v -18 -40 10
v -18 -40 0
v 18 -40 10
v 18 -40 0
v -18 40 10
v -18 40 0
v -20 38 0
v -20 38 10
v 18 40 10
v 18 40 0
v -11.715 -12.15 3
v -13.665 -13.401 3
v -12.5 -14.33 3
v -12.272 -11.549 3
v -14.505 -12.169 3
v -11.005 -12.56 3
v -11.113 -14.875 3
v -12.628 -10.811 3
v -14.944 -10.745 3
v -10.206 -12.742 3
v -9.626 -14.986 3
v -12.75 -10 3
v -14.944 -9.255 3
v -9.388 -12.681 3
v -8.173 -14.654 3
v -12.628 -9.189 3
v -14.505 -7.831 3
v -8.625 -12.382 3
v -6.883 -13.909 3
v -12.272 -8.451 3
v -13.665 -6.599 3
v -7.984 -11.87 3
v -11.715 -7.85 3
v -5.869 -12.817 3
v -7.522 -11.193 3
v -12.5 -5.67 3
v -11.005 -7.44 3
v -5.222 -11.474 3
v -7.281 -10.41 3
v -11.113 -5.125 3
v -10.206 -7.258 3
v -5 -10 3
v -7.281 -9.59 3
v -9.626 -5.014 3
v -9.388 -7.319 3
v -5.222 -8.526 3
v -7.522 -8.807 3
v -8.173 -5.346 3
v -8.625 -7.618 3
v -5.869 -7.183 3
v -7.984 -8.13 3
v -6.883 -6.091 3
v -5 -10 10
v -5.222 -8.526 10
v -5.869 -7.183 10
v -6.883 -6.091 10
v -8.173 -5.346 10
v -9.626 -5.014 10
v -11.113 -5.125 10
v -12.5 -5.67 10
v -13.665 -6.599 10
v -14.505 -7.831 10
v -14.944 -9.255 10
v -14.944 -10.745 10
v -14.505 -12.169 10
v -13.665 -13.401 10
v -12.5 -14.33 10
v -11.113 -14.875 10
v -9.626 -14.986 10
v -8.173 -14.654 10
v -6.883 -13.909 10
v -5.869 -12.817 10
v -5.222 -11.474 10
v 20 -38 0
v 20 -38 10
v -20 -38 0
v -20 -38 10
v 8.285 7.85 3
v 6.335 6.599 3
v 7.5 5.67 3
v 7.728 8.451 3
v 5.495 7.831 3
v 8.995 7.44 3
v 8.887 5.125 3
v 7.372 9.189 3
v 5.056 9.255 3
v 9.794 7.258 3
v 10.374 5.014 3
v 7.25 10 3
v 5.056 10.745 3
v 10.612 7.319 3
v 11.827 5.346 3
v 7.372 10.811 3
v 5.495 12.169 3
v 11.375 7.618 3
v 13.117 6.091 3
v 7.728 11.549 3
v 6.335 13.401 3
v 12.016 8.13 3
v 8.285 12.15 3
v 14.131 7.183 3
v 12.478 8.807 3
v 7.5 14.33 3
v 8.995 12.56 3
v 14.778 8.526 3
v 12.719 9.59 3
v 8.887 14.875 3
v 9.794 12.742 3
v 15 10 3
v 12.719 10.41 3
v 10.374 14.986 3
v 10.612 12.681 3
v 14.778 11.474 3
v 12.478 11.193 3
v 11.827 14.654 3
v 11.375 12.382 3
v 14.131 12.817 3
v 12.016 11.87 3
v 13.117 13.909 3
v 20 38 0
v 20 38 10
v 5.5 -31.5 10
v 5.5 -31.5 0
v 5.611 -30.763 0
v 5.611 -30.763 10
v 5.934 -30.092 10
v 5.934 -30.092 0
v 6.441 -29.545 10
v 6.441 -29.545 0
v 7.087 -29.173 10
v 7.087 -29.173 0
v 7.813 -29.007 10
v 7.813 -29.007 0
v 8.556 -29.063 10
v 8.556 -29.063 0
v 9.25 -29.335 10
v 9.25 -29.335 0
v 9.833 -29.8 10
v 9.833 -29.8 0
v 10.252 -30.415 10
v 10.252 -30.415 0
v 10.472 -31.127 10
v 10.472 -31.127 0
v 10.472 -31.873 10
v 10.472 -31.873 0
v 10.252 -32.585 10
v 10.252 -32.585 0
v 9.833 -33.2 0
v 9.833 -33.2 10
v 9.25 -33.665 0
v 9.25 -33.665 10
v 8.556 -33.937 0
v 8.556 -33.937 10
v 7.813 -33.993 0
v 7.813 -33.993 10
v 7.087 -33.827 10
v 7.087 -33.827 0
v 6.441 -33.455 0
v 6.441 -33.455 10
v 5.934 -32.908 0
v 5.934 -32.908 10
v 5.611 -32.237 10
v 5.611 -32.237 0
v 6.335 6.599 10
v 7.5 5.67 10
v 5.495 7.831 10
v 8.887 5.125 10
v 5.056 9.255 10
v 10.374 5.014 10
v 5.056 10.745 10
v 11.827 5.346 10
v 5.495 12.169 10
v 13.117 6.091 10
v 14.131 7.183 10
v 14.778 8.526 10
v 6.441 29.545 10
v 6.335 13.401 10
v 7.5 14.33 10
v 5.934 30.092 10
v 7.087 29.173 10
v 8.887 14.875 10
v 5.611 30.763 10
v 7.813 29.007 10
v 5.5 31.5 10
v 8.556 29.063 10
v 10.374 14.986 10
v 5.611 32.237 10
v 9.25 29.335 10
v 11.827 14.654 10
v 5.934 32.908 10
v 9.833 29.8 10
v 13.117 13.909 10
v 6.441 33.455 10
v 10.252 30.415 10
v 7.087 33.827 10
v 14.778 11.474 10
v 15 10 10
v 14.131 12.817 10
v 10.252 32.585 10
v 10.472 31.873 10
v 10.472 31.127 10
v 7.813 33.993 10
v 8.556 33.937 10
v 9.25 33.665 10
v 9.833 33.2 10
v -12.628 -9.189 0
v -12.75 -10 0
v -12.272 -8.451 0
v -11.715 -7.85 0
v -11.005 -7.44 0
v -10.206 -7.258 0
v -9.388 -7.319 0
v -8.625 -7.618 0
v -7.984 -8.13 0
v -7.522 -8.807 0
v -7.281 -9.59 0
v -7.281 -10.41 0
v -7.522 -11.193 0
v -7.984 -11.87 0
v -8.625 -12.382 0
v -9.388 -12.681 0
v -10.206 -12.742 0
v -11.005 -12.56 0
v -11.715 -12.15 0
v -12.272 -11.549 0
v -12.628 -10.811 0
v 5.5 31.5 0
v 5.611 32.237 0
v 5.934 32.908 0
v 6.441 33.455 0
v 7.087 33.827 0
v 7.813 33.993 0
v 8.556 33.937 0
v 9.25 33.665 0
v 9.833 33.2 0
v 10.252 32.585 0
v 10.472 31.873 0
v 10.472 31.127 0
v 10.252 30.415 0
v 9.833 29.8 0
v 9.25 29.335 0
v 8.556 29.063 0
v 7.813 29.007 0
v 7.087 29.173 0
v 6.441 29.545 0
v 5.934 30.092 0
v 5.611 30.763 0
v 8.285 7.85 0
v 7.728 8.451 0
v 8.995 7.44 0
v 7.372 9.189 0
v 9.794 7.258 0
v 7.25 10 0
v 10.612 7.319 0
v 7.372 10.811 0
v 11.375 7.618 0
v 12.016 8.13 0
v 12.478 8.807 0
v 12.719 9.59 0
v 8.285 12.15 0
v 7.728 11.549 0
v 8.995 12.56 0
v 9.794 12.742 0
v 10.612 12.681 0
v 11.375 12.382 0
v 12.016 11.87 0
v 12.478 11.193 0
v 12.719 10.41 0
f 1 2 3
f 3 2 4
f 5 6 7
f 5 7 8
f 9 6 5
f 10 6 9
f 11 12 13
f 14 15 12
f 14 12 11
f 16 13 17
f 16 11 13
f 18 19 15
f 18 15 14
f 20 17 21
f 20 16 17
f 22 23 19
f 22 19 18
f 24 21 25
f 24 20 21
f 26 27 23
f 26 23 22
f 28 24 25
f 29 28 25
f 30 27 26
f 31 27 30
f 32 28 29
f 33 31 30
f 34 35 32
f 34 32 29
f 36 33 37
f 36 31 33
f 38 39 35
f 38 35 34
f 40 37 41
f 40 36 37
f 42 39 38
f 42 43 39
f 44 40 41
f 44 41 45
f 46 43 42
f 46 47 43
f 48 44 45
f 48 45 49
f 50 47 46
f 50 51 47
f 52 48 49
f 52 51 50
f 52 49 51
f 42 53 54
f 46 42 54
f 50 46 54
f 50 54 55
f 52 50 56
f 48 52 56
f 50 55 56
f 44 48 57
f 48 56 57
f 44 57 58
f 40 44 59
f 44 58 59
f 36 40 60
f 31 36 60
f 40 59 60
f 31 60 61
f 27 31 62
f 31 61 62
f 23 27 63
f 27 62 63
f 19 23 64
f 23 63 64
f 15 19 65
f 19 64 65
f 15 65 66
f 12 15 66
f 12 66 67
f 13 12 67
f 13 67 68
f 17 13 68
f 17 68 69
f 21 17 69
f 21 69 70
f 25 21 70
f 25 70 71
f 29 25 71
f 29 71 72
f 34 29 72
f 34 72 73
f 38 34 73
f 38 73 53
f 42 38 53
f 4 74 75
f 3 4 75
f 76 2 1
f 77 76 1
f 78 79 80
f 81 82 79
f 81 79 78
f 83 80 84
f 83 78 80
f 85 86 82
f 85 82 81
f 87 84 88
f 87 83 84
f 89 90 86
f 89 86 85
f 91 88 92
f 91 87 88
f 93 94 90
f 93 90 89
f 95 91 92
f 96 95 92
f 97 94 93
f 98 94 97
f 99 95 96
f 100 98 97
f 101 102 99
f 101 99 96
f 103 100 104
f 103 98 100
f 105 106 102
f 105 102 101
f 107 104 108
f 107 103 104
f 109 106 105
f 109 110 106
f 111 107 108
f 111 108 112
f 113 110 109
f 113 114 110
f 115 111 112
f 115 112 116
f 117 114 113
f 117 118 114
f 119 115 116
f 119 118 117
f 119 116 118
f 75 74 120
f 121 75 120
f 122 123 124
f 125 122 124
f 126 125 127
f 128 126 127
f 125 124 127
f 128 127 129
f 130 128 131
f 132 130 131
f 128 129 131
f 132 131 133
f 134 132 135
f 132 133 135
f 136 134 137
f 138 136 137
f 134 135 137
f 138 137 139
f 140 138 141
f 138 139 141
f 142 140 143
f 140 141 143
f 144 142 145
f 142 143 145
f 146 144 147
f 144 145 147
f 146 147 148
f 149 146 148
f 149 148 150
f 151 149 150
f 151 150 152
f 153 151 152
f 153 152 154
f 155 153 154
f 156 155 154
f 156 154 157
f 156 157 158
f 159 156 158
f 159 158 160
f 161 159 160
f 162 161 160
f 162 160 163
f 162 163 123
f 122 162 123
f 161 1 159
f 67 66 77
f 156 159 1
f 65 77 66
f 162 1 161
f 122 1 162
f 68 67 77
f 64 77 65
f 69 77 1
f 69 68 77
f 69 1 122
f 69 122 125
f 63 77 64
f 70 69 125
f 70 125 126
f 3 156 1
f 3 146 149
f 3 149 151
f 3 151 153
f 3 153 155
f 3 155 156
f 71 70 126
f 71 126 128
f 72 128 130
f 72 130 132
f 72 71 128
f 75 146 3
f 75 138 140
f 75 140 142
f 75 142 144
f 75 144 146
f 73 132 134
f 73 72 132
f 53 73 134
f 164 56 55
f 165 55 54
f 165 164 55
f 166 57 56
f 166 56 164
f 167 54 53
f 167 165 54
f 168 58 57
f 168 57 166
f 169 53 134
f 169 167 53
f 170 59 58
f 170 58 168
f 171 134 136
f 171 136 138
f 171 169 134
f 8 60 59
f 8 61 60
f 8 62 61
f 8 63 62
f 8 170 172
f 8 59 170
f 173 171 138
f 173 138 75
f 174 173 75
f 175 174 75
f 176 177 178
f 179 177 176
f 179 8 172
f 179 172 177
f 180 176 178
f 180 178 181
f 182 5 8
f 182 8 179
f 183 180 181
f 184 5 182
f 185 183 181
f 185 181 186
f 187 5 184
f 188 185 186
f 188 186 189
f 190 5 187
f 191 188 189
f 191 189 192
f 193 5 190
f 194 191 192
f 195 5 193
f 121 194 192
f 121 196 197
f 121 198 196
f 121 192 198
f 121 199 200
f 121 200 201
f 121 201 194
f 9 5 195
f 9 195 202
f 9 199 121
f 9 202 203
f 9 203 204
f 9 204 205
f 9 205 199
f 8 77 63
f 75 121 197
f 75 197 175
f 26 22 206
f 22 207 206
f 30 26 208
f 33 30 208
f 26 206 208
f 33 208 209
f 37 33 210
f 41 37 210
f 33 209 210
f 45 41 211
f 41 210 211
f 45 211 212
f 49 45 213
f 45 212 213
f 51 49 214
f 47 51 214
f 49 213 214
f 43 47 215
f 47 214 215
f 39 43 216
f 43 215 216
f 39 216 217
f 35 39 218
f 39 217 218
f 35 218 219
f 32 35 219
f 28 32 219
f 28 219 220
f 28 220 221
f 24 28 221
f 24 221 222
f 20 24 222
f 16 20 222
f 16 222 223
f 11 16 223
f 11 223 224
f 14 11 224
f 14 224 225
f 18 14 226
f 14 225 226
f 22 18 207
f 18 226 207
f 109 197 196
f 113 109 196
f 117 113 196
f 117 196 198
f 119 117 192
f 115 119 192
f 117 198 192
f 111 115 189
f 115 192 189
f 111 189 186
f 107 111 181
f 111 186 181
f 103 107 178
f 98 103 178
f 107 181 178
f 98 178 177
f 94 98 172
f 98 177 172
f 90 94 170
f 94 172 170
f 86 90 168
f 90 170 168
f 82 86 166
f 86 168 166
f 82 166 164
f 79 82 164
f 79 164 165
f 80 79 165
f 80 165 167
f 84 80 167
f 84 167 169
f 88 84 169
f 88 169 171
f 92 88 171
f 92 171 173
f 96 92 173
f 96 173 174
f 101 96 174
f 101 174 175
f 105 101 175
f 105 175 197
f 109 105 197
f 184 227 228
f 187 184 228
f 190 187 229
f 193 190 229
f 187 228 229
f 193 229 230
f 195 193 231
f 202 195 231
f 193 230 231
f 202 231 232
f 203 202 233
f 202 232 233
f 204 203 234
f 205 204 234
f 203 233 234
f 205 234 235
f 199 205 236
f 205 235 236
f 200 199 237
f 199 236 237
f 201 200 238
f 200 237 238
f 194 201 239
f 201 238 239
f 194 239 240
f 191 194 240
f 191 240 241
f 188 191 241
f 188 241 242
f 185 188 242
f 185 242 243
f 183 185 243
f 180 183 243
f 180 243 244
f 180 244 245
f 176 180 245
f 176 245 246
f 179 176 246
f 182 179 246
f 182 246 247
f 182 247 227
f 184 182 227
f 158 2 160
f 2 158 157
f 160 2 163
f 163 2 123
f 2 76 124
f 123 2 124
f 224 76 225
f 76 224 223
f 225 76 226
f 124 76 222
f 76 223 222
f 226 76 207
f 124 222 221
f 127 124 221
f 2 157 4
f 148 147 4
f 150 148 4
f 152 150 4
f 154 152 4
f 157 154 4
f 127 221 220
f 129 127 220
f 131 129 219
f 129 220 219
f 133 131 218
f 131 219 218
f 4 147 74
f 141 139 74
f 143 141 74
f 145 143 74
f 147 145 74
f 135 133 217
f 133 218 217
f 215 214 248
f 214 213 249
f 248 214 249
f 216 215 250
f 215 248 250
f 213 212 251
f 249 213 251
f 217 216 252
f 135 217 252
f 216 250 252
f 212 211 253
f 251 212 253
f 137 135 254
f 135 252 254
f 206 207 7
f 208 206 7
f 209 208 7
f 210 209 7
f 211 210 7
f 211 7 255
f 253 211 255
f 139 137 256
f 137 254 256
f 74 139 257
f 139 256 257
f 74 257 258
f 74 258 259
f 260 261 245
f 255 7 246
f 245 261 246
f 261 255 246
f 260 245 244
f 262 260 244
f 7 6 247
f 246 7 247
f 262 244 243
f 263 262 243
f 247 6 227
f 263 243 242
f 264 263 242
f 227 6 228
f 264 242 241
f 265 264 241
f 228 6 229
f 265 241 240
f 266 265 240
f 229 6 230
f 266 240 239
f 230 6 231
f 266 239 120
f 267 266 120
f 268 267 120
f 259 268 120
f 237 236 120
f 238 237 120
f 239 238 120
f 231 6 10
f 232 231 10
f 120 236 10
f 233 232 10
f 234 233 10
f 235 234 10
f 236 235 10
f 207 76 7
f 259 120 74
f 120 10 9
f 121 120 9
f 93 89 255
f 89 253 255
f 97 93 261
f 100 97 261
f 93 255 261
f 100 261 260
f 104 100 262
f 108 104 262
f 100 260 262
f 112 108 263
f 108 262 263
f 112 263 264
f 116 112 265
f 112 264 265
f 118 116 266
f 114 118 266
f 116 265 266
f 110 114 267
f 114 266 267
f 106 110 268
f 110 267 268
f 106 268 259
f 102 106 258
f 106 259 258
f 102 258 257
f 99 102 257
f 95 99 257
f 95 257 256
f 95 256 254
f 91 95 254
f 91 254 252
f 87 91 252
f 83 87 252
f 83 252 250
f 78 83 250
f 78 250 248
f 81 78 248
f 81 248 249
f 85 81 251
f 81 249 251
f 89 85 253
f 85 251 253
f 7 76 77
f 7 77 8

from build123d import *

# Parameters (mm, degrees)
ESQUISSE1_W                                        = 40
ESQUISSE1_H                                        = 80
BOSS_EXTRU_1_DEPTH                                 = 10
CHANFREIN1_SIZE                                    = 2
TROU_TARAUD_M61_D                                  = 5
CHAMBRAGE_POUR_VIS_T_TE_HEXAGONALE_M51_D           = 5.5
CHAMBRAGE_POUR_VIS_T_TE_HEXAGONALE_M51_CBORE_D     = 10
CHAMBRAGE_POUR_VIS_T_TE_HEXAGONALE_M51_CBORE_DEPTH = 7


with BuildPart() as part:
    # Esquisse1 → Boss.-Extru.1 (new body)
    with BuildSketch(Plane.XY):
        Rectangle(ESQUISSE1_W, ESQUISSE1_H)
    extrude(amount=BOSS_EXTRU_1_DEPTH)

    # Chanfrein1
    chanfrein1_edges = [part.edges().sort_by_distance(p)[0] for p in [
        (-20, 40, 5),
        (20, 40, 5),
        (20, -40, 5),
        (-20, -40, 5),
    ]]
    chamfer(chanfrein1_edges, length=CHANFREIN1_SIZE)

    # Trou taraudé M61 (through all)
    with Locations(Plane.XY.offset(10)):
        with Locations((8, 31.5), (8, -31.5)):
            Hole(TROU_TARAUD_M61_D / 2)

    # Chambrage pour vis à tête hexagonale M51 (through all)
    with Locations(Plane.XY.offset(10)):
        with Locations((10, 10), (-10, -10)):
            CounterBoreHole(CHAMBRAGE_POUR_VIS_T_TE_HEXAGONALE_M51_D / 2, CHAMBRAGE_POUR_VIS_T_TE_HEXAGONALE_M51_CBORE_D / 2, CHAMBRAGE_POUR_VIS_T_TE_HEXAGONALE_M51_CBORE_DEPTH)


solid = part.part
